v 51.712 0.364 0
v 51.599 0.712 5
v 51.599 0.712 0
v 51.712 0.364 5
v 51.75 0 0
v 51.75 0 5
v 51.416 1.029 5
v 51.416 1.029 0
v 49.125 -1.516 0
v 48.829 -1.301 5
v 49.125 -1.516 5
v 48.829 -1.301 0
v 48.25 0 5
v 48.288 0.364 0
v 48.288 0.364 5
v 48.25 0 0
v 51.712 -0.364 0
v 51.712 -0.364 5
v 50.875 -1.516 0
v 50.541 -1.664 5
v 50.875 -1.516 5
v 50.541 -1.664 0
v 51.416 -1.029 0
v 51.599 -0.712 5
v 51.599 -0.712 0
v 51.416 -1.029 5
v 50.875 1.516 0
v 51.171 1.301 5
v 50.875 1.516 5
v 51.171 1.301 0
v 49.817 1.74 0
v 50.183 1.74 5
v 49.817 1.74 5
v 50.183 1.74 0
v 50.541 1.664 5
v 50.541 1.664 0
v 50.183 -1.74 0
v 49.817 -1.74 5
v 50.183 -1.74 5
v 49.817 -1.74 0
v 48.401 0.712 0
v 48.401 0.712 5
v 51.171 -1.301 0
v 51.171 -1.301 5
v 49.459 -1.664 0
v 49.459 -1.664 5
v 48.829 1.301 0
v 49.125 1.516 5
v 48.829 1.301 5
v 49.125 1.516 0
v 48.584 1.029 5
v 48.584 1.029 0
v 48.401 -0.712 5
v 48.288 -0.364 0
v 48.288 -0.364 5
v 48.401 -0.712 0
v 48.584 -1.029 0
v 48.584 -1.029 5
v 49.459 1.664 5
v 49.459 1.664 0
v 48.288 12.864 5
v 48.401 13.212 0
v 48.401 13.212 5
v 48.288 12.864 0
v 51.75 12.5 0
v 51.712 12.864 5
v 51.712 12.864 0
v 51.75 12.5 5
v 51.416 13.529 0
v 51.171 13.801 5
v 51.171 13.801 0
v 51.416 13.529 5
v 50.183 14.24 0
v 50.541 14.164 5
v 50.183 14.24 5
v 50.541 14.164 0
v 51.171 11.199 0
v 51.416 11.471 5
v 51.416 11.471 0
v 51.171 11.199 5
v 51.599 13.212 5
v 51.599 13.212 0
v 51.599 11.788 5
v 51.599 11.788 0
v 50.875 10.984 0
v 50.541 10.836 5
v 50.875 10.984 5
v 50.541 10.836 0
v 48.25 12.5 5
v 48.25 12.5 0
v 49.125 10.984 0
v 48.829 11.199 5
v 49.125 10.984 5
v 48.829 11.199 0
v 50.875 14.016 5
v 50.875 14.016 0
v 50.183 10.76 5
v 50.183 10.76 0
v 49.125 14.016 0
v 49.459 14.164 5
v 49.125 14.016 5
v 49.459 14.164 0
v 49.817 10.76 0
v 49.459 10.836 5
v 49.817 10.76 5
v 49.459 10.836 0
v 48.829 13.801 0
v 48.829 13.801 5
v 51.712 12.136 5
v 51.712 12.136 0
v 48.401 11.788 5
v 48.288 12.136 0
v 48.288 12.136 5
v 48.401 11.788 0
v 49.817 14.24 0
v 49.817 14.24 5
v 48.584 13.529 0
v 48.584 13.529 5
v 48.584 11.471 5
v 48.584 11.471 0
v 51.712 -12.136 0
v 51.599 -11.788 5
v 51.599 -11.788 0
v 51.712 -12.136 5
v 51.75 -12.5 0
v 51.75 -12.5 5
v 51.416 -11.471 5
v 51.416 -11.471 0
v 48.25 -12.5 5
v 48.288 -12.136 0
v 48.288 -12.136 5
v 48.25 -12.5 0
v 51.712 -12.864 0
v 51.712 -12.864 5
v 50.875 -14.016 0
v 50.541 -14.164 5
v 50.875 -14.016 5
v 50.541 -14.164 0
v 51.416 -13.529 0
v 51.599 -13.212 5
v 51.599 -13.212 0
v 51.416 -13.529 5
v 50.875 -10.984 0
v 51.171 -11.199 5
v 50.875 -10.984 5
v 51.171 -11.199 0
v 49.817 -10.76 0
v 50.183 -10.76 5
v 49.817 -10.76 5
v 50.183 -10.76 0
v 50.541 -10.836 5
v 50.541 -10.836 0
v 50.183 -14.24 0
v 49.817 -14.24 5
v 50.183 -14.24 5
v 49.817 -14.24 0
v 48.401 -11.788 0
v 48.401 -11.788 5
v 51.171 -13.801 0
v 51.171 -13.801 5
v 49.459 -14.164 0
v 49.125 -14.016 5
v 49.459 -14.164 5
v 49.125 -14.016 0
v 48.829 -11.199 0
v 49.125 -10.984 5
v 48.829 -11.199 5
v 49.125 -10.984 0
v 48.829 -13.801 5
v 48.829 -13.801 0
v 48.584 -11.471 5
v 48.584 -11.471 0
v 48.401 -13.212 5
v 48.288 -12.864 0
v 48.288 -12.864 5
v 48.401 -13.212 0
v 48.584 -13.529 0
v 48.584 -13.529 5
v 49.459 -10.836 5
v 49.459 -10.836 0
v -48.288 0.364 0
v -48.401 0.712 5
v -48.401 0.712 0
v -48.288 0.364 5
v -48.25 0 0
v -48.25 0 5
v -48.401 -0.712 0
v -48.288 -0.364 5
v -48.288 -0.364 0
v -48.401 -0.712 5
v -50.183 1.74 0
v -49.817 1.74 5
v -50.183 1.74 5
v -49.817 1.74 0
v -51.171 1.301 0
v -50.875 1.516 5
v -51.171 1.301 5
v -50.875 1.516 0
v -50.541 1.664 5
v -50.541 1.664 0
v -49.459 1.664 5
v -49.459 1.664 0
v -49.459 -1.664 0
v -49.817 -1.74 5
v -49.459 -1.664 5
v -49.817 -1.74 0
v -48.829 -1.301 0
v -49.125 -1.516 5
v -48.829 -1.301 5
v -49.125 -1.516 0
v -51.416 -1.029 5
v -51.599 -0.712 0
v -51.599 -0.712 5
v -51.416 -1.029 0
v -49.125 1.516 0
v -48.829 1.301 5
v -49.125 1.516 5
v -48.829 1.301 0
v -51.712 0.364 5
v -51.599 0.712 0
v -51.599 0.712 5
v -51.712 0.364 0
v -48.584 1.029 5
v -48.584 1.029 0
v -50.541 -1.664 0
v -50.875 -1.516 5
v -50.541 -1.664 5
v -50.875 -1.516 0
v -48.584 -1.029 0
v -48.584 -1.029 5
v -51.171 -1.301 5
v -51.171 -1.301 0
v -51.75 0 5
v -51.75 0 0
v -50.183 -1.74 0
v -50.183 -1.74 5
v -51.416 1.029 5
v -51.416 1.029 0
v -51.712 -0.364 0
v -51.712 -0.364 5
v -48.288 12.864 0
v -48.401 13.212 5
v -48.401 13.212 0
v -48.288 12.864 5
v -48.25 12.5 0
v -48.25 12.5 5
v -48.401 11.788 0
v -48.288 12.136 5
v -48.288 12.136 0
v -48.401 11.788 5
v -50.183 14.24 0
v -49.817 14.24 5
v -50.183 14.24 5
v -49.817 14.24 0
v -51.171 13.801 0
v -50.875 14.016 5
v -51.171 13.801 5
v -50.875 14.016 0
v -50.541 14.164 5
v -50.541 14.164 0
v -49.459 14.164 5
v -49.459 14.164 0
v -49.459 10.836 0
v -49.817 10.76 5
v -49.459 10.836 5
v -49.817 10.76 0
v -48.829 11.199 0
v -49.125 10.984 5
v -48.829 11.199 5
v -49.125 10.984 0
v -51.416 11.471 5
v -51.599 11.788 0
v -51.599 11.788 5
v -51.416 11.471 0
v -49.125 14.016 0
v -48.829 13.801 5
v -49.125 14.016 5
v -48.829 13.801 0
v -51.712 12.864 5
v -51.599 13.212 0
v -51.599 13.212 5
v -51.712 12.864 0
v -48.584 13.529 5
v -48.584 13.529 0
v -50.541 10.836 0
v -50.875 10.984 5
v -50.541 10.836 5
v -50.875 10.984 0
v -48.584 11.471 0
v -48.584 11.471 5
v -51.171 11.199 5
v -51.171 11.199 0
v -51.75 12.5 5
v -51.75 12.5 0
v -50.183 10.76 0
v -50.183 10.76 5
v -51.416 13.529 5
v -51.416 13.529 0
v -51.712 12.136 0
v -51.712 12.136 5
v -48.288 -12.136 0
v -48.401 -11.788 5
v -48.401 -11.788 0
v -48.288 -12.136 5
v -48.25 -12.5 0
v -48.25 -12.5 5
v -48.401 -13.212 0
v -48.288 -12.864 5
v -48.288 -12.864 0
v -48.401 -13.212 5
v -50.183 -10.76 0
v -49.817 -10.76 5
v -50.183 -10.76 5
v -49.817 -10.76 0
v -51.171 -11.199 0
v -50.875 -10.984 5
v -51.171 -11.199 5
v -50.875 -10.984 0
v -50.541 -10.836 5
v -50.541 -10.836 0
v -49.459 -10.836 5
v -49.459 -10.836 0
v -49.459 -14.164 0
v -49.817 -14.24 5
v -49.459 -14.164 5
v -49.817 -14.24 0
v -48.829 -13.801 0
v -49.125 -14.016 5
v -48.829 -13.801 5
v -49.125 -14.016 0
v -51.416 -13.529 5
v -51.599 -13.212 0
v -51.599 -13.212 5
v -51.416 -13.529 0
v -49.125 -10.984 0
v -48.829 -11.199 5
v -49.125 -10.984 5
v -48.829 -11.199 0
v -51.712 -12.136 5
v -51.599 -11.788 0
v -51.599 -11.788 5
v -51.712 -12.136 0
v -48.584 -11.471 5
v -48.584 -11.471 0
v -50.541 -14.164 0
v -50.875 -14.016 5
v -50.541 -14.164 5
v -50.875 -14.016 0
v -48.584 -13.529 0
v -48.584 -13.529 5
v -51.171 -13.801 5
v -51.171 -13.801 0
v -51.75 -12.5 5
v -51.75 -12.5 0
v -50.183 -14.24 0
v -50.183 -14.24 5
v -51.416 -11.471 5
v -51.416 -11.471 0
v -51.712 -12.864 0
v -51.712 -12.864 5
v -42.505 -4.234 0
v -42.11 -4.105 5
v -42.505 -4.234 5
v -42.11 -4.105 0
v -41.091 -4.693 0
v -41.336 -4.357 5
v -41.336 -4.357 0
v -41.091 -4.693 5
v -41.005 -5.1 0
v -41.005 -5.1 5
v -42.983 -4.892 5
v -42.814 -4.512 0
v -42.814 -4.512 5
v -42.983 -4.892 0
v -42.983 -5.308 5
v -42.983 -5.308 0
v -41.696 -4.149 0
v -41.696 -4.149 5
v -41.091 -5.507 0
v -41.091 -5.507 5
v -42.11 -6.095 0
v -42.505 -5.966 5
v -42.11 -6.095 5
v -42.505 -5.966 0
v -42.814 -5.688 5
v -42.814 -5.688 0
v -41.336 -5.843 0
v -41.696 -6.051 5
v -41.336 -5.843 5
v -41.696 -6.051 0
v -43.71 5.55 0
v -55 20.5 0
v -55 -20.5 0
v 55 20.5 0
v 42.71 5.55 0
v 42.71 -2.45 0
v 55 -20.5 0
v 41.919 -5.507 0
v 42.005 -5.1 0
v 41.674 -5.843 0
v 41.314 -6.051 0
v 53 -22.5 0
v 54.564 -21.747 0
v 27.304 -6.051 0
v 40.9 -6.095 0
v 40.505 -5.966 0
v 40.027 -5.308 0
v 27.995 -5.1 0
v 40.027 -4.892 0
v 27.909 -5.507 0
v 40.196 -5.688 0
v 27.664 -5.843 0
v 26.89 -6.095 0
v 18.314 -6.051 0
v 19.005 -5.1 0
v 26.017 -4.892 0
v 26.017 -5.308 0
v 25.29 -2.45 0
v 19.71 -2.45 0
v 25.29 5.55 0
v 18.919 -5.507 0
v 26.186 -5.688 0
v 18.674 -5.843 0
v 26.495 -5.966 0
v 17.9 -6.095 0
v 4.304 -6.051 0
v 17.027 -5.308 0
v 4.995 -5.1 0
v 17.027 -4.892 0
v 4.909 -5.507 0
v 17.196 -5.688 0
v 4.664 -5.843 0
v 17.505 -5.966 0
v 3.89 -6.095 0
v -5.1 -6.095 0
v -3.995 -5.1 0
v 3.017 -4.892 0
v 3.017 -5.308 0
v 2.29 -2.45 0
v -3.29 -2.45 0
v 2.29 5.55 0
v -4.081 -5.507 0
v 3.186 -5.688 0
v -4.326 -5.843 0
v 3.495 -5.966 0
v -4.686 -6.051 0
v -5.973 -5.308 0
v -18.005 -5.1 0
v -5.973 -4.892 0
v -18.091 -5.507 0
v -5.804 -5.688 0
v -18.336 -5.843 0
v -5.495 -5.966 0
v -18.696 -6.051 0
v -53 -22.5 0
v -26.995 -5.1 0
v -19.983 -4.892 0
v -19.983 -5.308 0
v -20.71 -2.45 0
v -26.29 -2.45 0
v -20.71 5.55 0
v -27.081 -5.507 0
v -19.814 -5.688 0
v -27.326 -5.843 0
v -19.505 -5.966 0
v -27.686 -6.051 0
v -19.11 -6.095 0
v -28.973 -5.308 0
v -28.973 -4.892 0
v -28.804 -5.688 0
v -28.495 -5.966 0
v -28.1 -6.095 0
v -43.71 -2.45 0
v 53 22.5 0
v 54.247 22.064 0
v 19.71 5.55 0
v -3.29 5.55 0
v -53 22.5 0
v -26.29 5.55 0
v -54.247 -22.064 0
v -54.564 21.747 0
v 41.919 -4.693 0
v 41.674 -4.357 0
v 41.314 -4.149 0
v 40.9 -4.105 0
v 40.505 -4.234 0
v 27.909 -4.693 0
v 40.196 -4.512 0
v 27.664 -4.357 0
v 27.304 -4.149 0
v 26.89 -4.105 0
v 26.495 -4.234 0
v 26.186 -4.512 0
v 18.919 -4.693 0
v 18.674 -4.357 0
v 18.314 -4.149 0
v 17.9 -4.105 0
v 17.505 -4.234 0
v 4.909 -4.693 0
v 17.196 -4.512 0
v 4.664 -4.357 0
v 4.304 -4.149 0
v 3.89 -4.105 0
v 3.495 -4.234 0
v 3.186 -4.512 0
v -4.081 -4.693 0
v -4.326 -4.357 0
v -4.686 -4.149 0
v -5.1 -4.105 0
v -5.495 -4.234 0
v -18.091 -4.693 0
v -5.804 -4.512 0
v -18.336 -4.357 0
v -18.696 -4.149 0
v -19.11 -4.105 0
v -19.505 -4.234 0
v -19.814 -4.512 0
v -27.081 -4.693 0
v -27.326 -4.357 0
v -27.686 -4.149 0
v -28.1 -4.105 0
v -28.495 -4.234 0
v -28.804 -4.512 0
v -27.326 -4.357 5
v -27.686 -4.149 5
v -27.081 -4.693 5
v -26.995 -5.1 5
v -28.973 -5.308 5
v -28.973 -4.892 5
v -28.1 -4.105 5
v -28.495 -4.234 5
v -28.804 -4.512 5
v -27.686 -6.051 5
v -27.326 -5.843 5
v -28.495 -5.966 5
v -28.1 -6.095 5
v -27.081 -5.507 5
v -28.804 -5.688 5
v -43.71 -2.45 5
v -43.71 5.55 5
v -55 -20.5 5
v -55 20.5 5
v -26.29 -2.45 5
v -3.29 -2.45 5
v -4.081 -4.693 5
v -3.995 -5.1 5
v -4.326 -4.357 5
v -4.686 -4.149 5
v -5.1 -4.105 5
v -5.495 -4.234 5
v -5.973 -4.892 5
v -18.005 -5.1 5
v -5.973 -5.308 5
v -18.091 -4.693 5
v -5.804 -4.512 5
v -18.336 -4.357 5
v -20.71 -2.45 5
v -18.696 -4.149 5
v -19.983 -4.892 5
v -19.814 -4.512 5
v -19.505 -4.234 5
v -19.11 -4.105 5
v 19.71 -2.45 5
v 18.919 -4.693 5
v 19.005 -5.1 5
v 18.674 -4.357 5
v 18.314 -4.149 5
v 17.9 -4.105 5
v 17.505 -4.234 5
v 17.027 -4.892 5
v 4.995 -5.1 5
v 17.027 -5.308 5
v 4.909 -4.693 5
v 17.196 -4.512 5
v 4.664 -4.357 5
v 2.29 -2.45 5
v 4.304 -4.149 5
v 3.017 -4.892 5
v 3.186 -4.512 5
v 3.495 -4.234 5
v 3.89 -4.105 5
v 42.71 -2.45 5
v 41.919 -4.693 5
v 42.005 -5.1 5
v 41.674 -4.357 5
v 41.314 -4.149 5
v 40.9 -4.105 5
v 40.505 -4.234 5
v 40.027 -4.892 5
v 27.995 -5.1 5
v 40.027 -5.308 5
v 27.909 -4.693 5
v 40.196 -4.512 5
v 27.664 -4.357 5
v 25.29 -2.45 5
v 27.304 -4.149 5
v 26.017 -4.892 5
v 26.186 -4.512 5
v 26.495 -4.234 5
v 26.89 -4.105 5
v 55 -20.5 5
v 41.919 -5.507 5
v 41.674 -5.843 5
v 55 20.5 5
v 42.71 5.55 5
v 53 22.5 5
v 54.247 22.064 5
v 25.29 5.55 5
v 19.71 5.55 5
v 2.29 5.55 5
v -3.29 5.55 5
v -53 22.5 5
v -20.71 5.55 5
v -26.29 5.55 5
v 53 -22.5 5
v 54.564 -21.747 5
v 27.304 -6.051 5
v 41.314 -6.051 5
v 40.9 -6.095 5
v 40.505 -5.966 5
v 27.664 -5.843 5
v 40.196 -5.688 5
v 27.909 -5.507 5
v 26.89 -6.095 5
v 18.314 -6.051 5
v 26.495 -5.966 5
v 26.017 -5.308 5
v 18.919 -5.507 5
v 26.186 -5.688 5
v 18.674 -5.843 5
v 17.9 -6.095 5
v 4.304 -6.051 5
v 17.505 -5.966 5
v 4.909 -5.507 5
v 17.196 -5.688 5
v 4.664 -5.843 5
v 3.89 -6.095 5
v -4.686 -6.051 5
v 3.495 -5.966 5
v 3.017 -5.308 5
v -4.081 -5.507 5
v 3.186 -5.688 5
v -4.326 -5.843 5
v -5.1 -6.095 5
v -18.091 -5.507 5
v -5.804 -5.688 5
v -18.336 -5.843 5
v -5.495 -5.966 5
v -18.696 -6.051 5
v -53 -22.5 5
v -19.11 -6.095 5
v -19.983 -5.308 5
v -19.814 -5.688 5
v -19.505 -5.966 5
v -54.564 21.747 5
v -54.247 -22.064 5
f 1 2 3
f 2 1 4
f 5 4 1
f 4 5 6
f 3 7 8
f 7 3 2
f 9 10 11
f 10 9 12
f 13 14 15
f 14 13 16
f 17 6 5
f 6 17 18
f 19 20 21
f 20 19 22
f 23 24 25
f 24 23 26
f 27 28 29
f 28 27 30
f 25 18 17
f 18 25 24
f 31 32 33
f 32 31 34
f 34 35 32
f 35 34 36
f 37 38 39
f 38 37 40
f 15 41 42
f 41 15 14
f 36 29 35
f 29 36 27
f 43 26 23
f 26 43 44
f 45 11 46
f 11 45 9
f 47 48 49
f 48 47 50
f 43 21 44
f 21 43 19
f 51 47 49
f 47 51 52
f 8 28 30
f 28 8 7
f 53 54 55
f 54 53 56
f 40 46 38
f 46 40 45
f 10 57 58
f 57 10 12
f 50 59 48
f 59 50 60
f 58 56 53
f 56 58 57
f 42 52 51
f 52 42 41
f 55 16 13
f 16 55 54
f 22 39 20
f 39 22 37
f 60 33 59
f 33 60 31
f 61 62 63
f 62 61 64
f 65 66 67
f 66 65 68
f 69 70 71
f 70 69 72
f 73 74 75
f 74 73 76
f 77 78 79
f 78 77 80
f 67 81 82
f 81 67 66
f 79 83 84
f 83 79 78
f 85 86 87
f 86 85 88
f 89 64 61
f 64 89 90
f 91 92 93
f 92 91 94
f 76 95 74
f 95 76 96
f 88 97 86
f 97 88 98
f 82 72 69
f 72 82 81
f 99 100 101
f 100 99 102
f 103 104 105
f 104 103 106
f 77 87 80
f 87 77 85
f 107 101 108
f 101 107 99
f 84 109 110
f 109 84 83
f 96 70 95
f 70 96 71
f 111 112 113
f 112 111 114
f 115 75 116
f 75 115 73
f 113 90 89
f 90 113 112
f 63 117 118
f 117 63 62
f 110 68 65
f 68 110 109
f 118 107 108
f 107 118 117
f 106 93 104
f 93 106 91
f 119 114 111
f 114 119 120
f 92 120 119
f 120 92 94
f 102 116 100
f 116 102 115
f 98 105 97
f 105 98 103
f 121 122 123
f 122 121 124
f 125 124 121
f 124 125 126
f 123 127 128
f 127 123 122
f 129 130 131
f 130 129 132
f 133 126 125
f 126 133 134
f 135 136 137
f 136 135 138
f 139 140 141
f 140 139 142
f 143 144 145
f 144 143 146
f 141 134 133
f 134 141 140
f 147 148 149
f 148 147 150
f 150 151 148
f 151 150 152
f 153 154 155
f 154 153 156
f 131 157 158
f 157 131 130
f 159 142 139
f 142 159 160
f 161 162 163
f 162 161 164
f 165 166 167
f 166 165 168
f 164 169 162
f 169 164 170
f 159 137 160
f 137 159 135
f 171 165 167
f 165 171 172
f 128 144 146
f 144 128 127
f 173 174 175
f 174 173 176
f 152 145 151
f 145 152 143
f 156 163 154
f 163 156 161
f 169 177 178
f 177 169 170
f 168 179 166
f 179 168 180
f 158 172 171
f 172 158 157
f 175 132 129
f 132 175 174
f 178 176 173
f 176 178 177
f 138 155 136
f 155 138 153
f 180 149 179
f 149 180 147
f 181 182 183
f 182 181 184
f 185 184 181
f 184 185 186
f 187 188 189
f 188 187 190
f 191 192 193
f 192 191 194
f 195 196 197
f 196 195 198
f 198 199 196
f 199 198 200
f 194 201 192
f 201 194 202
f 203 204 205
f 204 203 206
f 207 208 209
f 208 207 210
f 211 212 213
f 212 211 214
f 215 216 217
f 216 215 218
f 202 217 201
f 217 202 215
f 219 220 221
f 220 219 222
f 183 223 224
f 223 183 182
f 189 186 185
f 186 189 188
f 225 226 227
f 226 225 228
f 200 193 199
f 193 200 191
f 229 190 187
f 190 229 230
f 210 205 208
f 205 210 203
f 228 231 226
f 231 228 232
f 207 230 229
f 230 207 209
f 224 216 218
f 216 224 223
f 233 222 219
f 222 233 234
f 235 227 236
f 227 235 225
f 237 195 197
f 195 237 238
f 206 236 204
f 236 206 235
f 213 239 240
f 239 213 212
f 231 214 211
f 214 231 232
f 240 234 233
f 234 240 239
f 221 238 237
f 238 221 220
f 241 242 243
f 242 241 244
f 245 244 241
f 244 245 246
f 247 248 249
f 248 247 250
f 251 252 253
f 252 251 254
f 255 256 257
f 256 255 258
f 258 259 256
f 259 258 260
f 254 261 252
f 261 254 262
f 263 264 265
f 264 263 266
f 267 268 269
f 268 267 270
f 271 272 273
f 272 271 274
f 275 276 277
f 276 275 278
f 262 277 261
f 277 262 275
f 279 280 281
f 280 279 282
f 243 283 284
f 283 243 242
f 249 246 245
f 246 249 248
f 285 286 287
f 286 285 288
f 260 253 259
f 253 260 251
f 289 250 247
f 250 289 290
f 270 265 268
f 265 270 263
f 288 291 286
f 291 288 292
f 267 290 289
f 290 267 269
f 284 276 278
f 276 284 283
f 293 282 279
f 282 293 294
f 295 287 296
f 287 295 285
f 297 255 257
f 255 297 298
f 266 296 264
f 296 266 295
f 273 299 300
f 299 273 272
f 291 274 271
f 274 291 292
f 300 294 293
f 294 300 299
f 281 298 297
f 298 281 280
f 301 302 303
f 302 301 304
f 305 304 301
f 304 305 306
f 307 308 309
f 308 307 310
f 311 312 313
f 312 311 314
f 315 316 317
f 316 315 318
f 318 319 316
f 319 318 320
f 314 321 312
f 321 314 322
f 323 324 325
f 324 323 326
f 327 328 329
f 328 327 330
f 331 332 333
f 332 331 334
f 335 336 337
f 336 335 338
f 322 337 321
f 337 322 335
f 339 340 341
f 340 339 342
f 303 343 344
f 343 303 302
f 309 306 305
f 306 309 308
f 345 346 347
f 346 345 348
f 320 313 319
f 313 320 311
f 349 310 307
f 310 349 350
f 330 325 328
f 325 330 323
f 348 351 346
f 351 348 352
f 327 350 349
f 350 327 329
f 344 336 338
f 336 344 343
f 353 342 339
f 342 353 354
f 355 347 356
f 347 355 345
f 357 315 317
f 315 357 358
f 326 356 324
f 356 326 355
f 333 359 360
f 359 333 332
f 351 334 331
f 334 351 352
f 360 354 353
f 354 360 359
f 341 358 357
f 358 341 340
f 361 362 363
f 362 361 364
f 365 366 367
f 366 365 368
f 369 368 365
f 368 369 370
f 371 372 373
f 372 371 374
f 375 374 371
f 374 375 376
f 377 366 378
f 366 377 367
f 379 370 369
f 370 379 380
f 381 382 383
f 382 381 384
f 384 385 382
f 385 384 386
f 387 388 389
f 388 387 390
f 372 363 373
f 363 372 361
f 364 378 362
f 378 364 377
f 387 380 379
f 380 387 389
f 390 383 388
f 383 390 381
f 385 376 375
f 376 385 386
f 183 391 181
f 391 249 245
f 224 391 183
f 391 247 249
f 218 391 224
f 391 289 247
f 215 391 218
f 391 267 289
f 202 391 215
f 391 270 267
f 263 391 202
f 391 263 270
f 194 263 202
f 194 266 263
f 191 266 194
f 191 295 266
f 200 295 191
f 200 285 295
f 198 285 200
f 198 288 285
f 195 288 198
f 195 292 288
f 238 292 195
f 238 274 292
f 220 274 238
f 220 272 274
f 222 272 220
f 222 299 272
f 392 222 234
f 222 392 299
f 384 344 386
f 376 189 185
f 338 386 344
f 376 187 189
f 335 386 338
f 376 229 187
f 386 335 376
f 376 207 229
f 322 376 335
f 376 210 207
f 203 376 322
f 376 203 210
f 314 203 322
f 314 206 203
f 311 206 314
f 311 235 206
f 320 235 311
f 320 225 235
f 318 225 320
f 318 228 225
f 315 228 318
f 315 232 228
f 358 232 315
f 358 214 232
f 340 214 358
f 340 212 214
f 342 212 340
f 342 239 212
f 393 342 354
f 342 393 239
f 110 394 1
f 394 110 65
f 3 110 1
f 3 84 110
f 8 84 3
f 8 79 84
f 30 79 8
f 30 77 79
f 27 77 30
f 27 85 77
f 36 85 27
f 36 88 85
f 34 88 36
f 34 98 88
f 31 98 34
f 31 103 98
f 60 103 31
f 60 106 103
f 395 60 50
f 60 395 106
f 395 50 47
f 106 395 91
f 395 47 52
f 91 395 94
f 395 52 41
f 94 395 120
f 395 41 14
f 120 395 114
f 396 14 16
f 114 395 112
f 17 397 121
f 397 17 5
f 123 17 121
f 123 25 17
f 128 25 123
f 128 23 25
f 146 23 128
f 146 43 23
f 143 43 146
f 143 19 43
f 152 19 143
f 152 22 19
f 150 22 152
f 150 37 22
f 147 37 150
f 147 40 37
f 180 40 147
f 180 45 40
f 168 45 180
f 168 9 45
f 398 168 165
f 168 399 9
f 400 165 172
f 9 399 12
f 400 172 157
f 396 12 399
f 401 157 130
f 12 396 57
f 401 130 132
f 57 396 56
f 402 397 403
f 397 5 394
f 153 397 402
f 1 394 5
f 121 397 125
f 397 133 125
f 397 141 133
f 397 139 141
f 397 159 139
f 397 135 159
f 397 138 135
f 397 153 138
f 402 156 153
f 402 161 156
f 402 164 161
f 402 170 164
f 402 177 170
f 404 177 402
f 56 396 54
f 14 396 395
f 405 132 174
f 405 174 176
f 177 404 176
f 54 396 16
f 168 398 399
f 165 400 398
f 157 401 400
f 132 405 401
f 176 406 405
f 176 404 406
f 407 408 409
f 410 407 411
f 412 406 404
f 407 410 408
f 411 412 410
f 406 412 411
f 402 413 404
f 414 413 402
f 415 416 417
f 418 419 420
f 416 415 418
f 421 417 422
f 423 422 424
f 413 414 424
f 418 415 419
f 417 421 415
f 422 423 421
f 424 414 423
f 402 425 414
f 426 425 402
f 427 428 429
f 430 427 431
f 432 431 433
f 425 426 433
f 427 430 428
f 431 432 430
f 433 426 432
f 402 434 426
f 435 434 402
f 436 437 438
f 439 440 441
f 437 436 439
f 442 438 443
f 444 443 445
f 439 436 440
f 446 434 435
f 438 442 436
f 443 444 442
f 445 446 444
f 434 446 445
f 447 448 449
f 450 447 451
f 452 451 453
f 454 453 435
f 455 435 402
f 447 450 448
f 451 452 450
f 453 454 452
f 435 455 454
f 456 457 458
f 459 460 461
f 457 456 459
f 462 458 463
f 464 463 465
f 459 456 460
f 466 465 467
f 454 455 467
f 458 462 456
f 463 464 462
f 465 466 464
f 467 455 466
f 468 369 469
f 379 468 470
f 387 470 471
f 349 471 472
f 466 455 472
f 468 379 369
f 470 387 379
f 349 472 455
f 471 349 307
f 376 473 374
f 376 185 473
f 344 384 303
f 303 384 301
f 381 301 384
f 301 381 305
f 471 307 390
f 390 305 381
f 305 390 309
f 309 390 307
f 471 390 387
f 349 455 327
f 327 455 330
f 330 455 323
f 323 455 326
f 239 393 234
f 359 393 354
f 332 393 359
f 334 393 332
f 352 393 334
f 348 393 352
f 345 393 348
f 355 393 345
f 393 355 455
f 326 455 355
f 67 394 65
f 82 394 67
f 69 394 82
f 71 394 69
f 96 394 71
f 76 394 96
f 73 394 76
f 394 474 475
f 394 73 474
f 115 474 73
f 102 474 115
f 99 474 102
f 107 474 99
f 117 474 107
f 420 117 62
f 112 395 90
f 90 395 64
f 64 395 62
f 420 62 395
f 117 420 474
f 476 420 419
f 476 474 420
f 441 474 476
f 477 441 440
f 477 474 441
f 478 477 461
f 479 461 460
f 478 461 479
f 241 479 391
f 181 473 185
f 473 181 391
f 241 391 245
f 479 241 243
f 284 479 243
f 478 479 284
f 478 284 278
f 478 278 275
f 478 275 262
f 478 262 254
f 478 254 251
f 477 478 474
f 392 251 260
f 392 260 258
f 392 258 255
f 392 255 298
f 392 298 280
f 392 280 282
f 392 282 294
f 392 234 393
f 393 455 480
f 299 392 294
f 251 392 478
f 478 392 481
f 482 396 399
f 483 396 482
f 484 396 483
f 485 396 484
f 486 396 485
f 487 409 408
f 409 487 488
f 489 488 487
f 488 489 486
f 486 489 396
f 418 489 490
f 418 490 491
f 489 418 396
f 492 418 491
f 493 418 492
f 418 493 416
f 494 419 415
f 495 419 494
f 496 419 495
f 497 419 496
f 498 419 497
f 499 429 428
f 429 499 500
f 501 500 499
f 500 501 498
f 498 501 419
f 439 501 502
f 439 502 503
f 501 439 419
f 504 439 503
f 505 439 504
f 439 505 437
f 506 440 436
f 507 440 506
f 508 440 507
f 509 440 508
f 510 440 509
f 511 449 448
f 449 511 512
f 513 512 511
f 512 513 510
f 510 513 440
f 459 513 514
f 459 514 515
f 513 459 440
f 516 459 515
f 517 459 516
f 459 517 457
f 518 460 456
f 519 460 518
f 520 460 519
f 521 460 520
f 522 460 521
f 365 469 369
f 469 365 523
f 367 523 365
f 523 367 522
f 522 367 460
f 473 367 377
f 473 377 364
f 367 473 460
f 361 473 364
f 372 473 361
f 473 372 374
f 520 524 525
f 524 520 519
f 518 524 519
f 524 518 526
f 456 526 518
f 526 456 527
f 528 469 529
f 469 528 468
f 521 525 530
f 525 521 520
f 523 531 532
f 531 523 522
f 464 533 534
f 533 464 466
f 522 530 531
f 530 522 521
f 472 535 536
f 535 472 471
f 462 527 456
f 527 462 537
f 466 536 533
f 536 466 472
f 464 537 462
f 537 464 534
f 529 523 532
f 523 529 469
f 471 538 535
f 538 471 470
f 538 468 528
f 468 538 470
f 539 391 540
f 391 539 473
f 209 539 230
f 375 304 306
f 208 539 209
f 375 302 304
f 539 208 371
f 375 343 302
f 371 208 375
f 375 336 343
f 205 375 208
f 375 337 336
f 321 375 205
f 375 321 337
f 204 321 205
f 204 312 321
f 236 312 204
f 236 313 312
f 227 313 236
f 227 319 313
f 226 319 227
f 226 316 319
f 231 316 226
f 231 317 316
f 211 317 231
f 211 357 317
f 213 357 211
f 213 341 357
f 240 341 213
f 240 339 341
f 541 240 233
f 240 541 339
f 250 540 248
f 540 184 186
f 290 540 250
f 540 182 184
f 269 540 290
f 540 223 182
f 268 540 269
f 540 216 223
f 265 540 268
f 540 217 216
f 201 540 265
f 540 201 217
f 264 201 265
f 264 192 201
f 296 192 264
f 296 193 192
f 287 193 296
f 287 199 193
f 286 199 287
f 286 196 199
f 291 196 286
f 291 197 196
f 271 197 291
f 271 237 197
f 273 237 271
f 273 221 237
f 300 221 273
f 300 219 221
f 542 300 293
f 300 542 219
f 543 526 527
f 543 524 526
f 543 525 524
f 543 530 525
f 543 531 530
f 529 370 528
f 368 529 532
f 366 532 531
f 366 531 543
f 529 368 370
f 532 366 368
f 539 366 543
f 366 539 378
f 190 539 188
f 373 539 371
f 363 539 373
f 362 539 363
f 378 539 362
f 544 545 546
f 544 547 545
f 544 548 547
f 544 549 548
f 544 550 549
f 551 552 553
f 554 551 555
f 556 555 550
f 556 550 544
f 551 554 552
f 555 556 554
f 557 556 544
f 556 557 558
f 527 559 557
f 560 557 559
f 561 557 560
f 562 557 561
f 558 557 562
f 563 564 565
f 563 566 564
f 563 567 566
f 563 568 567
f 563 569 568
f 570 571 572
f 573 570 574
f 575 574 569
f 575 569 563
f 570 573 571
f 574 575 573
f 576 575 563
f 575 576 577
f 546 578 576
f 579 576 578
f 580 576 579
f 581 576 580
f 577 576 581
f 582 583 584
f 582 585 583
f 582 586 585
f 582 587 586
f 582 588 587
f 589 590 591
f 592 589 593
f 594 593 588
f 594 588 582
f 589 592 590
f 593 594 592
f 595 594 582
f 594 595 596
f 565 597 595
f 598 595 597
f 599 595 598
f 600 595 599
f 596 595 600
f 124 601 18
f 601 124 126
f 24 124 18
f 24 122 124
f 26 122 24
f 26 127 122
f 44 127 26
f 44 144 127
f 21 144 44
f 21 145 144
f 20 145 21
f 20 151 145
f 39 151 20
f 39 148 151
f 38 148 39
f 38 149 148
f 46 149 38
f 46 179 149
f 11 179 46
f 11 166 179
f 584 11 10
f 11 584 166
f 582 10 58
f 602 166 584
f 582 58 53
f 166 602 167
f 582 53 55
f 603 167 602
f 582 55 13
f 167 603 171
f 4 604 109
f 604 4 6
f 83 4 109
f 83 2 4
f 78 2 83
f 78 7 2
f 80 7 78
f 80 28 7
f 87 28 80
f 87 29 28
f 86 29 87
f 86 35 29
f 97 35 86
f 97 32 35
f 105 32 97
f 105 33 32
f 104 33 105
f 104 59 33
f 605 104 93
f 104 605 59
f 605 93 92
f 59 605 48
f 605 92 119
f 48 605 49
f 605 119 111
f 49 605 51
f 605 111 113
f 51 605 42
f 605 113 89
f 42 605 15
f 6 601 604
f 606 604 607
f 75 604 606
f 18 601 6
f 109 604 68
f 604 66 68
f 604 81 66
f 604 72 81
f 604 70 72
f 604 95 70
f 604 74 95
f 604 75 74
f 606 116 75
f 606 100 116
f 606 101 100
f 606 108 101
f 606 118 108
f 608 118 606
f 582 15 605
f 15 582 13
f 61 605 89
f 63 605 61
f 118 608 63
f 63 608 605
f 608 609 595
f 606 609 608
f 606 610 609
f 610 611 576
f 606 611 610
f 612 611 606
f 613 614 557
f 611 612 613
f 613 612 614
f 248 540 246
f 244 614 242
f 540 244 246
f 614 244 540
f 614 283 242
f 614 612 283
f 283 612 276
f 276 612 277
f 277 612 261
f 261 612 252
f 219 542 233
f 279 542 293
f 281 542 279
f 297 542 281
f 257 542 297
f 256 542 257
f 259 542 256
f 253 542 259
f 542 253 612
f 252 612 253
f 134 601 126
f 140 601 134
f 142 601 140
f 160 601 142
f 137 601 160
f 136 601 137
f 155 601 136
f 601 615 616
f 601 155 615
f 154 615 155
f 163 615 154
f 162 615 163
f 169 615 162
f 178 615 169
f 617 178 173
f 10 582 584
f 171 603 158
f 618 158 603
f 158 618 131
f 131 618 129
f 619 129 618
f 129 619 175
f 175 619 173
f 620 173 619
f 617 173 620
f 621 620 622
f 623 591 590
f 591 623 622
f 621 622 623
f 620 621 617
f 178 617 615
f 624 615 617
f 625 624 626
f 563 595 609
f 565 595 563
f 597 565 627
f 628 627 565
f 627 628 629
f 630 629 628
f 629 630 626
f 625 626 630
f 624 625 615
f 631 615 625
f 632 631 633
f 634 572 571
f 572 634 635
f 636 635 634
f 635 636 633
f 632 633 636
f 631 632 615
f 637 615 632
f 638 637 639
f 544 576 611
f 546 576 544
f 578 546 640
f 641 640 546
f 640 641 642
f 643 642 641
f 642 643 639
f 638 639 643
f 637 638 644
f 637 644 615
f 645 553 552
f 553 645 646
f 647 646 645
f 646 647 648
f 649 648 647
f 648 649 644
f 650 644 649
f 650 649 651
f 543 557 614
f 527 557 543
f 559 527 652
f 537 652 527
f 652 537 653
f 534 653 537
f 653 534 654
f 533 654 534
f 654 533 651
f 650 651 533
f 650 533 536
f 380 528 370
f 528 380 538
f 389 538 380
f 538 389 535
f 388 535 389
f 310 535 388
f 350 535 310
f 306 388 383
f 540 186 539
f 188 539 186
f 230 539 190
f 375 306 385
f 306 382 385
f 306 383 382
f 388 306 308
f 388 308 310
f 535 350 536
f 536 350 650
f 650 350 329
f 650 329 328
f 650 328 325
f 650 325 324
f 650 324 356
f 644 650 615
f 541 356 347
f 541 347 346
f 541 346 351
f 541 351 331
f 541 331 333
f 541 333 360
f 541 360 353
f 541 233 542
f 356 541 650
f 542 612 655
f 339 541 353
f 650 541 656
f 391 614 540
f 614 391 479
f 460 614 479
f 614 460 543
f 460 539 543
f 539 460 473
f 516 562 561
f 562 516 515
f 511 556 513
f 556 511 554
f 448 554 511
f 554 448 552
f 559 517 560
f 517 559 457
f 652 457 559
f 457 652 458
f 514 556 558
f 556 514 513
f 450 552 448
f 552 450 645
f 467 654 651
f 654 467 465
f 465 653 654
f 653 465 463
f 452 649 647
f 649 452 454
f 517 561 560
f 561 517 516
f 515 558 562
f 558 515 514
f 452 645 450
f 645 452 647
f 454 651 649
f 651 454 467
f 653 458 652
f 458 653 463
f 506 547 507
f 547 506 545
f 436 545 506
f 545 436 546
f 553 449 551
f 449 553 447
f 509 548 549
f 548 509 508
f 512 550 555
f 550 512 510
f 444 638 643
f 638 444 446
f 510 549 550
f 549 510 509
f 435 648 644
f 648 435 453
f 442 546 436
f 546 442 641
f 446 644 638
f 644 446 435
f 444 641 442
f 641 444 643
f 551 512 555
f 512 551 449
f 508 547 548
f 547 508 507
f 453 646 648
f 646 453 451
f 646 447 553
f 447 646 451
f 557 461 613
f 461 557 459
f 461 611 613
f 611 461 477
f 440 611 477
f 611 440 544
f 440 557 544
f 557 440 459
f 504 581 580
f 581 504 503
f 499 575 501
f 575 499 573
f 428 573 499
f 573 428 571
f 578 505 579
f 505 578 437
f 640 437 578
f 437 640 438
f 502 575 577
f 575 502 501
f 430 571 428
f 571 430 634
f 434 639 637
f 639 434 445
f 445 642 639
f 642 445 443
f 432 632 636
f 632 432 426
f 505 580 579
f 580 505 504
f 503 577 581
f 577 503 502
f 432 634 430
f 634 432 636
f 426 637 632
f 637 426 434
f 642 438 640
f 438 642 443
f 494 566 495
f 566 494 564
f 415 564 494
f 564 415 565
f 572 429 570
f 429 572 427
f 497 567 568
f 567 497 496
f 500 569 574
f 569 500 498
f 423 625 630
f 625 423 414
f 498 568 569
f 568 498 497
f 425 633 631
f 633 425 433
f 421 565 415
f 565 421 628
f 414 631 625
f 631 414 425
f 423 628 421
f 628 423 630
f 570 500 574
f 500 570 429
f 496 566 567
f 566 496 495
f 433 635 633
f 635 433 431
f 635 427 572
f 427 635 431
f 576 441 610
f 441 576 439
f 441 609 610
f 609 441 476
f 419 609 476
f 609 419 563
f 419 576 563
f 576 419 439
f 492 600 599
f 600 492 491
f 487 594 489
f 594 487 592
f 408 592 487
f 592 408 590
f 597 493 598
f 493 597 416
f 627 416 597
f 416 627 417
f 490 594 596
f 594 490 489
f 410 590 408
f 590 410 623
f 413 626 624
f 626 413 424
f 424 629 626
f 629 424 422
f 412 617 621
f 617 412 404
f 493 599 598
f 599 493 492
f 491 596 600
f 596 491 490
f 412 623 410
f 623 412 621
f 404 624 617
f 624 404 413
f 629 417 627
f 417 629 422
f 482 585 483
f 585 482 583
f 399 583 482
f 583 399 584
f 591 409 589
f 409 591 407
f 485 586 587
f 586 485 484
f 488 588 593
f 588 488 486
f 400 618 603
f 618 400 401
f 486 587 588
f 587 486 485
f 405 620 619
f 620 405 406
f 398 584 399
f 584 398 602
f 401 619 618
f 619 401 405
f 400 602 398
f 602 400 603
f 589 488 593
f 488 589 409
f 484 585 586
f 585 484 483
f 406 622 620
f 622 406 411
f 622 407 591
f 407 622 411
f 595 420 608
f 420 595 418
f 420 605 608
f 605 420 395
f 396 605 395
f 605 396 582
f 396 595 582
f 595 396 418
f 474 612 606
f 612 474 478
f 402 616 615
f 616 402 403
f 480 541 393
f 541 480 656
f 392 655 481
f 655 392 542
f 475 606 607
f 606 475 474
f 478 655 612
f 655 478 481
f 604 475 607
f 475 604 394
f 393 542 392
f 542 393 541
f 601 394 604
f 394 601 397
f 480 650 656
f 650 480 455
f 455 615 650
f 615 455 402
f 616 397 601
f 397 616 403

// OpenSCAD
// Main box
BOX_W = 110;      // width  (X)
BOX_L = 45;     // length (Y)
BOX_H = 5;    
BOX_R = 2;
HOLE_PADDING = 5;
HOLE_DIAM = 4.5;
HOLE_FN = 30;

CONNECTOR_PINS = 2;


// Main plate with rounded corners
difference(){
    linear_extrude(BOX_H)
        offset(r = BOX_R) 
            offset(r = -BOX_R) 
                square([BOX_W, BOX_L], center = true);
                
             
    mounting_holes(BOX_W,HOLE_PADDING);
    
    ROW1 = -5;
    POS_X= (BOX_W/2)-20;
//    POS_X = -40;
    echo(POS_X);
    for(x= [0-POS_X:23:BOX_W/2-10]){
        connector(x,ROW1,CONNECTOR_PINS);
    }
 //       connector(0,ROW1,CONNECTOR_PINS);
//        connector(23,ROW1,CONNECTOR_PINS);

    
}

module connector(posX,posY,pins){
    connector_holes(posX,posY,pins);
    connector_body(posX,posY,pins);
}




module connector_holes(xPos,yPos,pins){
    X = xPos;
    Y = yPos;
    //holes_between = 3.81*pins+6.19;
    holes_between = 3.81 * (pins-1)+10+0.2;
    
    translate( [X - holes_between/2, Y -0.1] )
        hole_M2();

    translate( [X + holes_between/2, Y -0.1] )
        hole_M2();
}



module connector_body(xPos, yPos,pins) {
    body_w = pins * 3.81 + 9.8;   // total width of the plastic body
    body_l = 8;  //8.1            // depth of the body (Y direction)
    
    y = yPos + 2.55 + body_l/2;
    
    translate([xPos, y, 0])
        linear_extrude(BOX_H)
            translate([-body_w/2, -body_l/2, -0.1])
                square([body_w, body_l]);
}



module mounting_holes(w,padding){
    // Right side
    translate([ w/2 - padding,  0, -0.1]) 
    hole_M3();
    
    translate([ w/2 - padding,  25/2, -0.1]) 
    hole_M3();

    translate([ w/2 - padding, 0- 25/2, -0.1]) 
    hole_M3();

    // Left side holes
    translate([ 0- w/2 + padding,  0, -0.1]) 
    hole_M3();
    
    translate([0- w/2 + padding,  25/2, -0.1]) 
    hole_M3();

    translate([0- w/2 + padding, 0- 25/2, -0.1]) 
    hole_M3();

    
}


module hole_M2(){
    cylinder(h = BOX_H + 0.2, d = 2, $fn=15);
}


module hole_M3(){
    cylinder(h = BOX_H + 0.2, d = 3.5, $fn=HOLE_FN);
}
